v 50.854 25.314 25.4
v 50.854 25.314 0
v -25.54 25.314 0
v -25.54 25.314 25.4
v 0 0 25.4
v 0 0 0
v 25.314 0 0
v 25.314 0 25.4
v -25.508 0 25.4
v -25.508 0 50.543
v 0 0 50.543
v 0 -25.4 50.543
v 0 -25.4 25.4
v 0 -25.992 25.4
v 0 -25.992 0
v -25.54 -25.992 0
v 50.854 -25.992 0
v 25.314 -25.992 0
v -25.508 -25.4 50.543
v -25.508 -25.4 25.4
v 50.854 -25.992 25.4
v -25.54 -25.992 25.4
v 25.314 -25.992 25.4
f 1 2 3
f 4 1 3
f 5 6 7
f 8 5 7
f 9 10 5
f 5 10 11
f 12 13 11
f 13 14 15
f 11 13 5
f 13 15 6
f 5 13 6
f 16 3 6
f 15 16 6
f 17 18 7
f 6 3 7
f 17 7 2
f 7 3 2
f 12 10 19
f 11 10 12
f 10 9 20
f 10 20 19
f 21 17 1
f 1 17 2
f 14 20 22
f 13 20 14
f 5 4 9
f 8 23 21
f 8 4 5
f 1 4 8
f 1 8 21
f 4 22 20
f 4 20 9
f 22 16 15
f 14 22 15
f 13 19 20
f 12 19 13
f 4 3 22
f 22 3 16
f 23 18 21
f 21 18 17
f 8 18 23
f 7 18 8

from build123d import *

# Parameters (mm, degrees)
F0_W     = 25.3138970584
F0_H     = 25.3138970584
F0_W_2   = 25.5399178714
F0_H_2   = 25.9919501841
F0_W_3   = 25.5399160087
F1_DEPTH = 25.4
F2_W     = 25.5080536008
F2_H     = 25.2275522798
F3_DEPTH = 25.4


with BuildPart() as f1:
    # F0 (on Top) → F1 (new body)
    with BuildSketch(Plane.XY):
        with Locations((12.6569485292, 12.6569485292)):
            Rectangle(F0_W, F0_H)
        with Locations((38.083855994, 12.6569485292)):
            Rectangle(F0_W_2, F0_H)
        with Locations((38.083855994, -12.9959750921)):
            Rectangle(F0_W_2, F0_H_2)
        with Locations((-12.7699580044, -12.9959750921)):
            Rectangle(F0_W_3, F0_H_2)
        with Locations((-12.7699580044, 12.6569485292)):
            Rectangle(F0_W_3, F0_H)
    extrude(amount=F1_DEPTH)

    # F2 (on Front) → F3 (join)
    with BuildSketch(Plane.XZ):
        with Locations((-12.7540268004, 37.929170765)):
            Rectangle(F2_W, F2_H)
    extrude(amount=F3_DEPTH)


solid = f1.part
